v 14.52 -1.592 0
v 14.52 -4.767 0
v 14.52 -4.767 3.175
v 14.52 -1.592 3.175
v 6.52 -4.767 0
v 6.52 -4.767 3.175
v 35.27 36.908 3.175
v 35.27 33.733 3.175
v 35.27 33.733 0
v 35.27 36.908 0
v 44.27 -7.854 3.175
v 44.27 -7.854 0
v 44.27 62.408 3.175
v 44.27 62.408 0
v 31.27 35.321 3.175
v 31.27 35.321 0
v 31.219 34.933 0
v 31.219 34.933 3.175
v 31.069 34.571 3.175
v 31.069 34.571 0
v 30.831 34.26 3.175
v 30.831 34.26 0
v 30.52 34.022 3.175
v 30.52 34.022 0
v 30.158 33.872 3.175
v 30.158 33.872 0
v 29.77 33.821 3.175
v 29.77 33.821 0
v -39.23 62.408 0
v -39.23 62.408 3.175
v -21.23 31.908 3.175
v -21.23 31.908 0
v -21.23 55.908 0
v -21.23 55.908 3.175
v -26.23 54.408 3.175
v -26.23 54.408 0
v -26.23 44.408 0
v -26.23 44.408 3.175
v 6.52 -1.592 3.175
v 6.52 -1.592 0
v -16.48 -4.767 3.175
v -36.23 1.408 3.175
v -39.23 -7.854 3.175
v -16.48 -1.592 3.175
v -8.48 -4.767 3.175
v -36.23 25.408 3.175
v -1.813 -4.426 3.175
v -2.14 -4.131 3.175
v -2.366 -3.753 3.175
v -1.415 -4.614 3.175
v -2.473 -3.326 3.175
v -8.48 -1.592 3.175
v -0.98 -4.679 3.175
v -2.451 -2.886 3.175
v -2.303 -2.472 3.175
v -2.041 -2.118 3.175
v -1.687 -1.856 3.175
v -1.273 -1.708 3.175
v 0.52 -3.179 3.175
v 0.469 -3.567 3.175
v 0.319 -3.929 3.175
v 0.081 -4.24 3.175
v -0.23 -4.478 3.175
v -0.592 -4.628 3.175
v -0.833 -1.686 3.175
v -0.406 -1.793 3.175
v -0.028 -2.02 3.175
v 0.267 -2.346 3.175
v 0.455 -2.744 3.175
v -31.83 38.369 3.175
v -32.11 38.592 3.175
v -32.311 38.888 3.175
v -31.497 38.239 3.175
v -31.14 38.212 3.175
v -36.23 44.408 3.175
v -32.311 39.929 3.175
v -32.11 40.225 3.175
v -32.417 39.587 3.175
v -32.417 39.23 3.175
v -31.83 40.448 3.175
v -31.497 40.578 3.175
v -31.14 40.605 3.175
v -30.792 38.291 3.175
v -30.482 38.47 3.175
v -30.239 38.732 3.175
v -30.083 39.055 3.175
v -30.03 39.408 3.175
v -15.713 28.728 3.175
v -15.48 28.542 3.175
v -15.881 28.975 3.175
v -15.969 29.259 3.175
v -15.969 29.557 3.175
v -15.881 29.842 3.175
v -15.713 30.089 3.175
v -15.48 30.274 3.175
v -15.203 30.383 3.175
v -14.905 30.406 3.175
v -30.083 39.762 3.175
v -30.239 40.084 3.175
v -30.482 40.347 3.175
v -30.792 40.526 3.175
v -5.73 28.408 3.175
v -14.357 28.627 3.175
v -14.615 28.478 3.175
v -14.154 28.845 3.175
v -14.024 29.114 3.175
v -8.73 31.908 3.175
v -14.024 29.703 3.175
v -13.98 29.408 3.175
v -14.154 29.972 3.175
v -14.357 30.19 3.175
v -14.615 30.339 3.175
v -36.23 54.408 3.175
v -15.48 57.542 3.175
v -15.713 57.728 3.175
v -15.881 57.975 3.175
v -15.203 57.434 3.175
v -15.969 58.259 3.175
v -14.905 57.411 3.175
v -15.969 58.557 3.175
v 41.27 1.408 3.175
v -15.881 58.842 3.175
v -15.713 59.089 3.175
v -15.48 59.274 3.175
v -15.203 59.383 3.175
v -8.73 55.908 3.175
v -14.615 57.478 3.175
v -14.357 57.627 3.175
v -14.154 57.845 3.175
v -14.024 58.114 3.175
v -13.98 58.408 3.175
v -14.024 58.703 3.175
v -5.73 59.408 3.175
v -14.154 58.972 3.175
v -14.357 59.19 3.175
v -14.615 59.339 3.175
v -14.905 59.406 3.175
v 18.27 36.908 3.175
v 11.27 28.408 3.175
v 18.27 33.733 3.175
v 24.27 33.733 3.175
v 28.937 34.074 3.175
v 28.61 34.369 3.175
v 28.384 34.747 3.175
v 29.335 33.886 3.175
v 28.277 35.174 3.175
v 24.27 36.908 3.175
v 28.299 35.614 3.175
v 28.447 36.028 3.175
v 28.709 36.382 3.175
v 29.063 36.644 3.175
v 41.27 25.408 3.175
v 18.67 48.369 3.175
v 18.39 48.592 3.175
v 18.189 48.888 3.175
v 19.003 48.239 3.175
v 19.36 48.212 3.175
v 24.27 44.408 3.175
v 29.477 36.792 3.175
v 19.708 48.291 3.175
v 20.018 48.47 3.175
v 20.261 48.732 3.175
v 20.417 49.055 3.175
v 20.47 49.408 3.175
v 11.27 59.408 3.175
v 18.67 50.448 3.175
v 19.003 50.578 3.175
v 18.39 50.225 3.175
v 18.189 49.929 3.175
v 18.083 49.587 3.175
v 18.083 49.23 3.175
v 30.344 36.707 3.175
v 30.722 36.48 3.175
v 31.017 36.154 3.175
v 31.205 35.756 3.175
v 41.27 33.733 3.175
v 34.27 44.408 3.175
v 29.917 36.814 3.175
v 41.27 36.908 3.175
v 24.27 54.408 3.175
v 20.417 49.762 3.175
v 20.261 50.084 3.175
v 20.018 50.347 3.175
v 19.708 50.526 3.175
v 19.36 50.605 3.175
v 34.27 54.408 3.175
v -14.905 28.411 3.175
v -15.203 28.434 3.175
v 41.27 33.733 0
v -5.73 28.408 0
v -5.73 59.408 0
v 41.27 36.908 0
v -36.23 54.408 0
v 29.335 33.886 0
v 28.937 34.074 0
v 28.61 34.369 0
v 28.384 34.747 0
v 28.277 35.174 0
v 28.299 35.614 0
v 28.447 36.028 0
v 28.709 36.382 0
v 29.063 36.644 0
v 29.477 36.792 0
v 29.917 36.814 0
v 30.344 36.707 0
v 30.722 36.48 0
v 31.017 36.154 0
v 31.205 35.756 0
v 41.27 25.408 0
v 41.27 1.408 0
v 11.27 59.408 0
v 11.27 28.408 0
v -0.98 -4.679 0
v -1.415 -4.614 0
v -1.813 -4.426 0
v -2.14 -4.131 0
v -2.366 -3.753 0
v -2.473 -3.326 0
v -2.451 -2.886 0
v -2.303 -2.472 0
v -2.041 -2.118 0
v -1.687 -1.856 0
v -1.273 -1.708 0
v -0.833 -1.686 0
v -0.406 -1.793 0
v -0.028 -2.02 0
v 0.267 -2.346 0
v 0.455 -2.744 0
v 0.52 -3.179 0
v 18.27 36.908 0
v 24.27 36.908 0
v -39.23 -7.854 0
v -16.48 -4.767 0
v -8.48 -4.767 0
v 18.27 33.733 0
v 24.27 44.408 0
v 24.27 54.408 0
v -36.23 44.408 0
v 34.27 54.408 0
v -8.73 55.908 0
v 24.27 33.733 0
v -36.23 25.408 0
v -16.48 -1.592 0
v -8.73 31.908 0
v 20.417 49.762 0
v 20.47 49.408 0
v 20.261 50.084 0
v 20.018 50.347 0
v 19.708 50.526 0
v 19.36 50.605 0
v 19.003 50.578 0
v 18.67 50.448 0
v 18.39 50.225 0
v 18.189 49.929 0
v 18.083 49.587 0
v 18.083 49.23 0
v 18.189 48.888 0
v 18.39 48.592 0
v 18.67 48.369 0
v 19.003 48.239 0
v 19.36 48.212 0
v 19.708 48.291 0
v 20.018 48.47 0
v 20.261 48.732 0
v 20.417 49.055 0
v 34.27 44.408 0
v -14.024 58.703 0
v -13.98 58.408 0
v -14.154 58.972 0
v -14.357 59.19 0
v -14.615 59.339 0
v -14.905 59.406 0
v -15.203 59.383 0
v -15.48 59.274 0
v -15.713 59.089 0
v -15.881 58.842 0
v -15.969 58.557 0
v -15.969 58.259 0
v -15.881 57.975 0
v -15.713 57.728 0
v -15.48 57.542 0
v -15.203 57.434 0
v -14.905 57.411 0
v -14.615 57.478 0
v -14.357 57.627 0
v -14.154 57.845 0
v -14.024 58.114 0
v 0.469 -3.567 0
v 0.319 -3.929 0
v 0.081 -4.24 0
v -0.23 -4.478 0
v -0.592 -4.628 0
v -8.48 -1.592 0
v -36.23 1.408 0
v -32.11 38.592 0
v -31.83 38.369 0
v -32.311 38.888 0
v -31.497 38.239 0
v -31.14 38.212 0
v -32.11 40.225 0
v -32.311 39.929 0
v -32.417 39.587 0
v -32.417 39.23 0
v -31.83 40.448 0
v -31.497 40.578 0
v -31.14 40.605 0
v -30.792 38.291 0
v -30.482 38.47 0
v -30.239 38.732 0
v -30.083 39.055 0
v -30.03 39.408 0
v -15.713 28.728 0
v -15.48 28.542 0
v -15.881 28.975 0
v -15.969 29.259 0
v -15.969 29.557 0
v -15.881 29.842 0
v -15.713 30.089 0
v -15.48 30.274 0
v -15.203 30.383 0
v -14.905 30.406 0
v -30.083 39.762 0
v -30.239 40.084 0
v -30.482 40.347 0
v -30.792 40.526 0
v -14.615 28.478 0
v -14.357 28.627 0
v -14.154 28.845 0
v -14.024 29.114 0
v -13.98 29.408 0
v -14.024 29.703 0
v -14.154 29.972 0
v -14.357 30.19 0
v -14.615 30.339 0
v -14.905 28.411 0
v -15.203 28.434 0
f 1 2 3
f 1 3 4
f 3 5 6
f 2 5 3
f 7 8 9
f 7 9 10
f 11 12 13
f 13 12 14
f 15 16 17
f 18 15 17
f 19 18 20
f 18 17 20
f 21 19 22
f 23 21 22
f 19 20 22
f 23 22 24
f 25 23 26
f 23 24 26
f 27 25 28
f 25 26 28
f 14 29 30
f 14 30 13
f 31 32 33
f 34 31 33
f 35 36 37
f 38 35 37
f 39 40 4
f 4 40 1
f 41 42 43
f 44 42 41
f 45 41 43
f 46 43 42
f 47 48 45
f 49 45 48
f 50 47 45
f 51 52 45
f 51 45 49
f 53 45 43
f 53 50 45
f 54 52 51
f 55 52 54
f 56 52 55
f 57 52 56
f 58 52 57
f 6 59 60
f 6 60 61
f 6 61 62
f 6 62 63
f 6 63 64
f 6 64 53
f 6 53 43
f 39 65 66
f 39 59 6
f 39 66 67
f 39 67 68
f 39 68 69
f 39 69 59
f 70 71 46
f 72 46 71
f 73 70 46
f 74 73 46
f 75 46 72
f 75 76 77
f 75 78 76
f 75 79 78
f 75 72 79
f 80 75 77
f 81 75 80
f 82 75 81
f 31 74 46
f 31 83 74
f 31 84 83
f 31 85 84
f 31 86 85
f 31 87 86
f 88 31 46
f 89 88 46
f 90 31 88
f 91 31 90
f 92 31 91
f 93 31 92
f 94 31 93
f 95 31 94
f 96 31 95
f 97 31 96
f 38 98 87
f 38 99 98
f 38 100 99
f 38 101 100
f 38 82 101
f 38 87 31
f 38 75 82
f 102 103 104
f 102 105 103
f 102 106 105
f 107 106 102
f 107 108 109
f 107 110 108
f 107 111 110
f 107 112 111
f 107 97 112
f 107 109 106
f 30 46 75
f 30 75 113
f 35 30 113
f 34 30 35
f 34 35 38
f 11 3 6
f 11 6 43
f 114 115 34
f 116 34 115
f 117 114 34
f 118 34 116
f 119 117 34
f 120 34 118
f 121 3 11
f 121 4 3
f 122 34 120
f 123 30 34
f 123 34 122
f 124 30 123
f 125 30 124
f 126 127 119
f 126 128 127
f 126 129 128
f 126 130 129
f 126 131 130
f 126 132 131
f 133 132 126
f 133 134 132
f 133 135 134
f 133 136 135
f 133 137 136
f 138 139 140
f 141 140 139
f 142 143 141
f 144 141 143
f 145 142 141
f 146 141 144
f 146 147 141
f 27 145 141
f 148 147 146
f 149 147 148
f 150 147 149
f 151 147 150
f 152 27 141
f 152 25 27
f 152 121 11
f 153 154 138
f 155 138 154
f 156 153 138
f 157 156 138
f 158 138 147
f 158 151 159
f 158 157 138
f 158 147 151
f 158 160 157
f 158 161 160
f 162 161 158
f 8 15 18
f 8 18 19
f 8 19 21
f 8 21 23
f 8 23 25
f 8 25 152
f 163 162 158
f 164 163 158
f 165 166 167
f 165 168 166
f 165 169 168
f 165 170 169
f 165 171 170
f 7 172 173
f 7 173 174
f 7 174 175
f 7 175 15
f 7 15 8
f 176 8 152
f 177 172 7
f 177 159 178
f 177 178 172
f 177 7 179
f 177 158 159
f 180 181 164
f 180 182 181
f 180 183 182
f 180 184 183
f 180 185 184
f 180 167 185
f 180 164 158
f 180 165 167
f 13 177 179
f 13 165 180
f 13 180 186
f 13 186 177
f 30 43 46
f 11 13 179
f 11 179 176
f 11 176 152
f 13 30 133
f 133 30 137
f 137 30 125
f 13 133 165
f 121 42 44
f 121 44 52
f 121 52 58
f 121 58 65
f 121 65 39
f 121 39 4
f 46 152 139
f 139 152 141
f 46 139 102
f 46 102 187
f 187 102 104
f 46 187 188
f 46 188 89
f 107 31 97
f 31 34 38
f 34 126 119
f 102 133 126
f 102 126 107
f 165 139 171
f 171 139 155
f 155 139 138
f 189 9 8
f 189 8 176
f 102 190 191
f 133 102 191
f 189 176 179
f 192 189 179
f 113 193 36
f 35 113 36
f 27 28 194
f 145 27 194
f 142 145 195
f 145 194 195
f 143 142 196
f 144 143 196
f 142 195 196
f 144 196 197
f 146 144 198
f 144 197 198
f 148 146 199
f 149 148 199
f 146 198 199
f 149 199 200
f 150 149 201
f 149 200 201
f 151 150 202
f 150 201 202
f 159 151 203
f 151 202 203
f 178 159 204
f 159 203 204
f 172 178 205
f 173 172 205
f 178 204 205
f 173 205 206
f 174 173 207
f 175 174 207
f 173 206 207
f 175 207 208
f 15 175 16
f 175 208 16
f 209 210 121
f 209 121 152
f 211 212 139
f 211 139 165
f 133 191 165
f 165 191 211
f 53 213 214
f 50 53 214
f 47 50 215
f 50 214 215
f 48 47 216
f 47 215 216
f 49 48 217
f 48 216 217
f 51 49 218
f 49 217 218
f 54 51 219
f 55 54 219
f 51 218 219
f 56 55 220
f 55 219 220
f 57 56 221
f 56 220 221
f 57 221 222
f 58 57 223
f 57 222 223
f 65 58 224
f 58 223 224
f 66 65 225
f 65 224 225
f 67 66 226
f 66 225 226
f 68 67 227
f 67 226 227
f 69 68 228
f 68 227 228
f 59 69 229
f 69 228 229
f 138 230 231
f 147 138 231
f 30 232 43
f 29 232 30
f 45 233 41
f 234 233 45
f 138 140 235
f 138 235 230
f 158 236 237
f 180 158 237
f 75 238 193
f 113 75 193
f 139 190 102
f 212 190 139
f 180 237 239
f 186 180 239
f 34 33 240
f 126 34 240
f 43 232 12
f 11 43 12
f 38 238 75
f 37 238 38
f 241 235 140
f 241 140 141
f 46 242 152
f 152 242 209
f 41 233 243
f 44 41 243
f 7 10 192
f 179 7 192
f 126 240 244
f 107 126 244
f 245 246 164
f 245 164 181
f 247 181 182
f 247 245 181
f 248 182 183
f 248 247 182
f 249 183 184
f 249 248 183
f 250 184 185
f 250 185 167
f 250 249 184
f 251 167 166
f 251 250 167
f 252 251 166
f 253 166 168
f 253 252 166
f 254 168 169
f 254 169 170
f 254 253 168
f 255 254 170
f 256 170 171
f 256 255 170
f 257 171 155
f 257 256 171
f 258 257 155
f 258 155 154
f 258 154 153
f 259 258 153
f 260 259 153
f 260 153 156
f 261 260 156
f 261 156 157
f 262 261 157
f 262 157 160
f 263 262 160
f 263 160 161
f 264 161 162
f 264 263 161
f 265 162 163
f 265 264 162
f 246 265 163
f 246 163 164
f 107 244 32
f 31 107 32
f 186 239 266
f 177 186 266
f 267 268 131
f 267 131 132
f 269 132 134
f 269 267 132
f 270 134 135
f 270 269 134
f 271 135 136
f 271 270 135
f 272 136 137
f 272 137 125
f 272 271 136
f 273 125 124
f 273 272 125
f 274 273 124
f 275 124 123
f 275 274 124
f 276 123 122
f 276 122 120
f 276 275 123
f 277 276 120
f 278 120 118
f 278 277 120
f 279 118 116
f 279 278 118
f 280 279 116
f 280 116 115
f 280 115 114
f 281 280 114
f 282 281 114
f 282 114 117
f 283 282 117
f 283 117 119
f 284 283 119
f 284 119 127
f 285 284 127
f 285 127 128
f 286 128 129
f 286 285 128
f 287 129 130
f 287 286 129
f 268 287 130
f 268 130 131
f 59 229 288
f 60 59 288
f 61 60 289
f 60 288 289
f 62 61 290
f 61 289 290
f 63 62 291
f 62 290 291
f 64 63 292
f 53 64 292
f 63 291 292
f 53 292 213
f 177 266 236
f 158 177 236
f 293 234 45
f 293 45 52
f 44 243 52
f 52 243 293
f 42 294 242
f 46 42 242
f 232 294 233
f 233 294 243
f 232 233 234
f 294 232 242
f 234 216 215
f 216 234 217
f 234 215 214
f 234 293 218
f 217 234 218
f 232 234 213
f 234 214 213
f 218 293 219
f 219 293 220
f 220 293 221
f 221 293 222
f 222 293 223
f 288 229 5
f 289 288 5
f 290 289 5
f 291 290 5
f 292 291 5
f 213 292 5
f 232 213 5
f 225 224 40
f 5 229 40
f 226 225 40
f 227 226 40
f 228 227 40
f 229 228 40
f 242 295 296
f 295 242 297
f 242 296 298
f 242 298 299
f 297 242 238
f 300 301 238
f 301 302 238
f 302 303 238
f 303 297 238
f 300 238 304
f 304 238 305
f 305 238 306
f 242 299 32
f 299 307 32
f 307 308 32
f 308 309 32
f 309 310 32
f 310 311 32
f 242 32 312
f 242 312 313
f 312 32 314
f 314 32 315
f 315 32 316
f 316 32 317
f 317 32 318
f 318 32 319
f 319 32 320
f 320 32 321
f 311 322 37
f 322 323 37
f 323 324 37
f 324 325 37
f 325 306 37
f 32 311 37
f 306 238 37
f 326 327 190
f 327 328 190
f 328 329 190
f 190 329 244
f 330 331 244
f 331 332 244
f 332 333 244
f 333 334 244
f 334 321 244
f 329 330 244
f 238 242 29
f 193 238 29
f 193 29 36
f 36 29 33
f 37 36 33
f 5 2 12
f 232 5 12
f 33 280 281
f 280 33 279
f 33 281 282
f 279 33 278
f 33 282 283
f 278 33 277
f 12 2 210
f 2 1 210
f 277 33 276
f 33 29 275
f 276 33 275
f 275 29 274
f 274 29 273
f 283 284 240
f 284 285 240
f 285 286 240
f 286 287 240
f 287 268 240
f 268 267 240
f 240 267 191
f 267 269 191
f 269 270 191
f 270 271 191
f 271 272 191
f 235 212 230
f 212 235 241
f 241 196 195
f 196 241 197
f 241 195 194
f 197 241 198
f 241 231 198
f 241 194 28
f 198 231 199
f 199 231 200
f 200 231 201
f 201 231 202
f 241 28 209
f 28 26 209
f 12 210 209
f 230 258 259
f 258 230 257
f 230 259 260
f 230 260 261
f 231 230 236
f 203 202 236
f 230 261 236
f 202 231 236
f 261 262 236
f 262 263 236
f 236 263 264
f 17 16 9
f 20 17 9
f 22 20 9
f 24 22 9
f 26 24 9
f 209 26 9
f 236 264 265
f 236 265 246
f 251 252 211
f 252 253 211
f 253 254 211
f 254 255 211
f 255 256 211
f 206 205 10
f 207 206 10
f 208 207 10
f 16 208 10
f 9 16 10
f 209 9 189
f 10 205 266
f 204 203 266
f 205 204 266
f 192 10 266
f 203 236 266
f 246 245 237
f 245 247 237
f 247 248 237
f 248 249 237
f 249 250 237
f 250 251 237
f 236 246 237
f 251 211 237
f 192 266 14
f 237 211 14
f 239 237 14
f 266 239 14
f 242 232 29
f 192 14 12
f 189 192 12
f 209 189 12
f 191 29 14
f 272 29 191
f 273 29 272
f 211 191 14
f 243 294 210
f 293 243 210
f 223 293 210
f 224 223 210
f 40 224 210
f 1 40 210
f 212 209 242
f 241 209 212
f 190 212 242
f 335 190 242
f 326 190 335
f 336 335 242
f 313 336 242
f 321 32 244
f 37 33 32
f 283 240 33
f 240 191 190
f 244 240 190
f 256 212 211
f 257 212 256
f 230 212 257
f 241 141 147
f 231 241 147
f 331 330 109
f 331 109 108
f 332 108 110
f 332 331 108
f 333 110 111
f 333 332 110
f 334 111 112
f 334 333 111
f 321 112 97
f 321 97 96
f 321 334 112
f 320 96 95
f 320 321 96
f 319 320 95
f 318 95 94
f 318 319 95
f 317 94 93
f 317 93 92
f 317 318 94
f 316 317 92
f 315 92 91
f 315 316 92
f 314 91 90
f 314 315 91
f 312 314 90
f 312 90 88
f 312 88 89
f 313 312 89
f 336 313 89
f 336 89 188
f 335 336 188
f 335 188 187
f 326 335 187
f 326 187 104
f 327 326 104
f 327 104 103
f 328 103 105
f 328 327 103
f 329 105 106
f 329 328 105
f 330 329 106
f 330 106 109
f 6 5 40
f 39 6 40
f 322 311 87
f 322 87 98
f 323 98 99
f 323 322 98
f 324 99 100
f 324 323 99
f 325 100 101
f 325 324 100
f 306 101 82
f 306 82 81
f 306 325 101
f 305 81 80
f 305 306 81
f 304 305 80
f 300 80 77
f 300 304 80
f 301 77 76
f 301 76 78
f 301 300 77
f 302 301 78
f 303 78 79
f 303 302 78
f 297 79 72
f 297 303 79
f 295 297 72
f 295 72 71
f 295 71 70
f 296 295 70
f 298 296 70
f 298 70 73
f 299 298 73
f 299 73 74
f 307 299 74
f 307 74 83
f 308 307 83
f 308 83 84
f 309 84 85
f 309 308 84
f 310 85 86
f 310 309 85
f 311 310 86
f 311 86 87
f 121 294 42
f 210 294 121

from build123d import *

# Parameters (mm, degrees)
F0_W     = 83.5
F0_H     = 70.2625
F0_W_2   = 8
F0_H_2   = 3.175
F0_W_3   = 77.5
F0_H_3   = 24
F0_R     = 1
F0_W_4   = 6
F0_W_5   = 17
F0_H_4   = 31
F0_W_6   = 10
F0_H_5   = 10
F0_R_2   = 1.2
F1_DEPTH = 3.175


# Not quite as in the source:
# - a length typed as a fraction of an inch, garbled in the dataset ("3 / 203.2 mm" for 3/8 in), is restored
# - a feature names something its author has since deleted; it is built from what else it names


with BuildPart() as f1:
    # F0 (on Top) → F1 (new body)
    with BuildSketch(Plane.XY):
        with Locations((2.5199788651, 27.2772044539)):
            Rectangle(F0_W, F0_H)
        with Locations((-12.4800211349, -3.1790455461)):
            Rectangle(F0_W_2, F0_H_2, mode=Mode.SUBTRACT)
        with BuildLine():
            ThreePointArc((-0.9800211349, -4.6790455461), (-2.0406813067, -2.1183853743), (0.5199788651, -3.1790455461))
            ThreePointArc((0.5199788651, -3.1790455461), (0.0806390368, -4.2397057179), (-0.9800211349, -4.6790455461))
        make_face(mode=Mode.SUBTRACT)
        with Locations((10.5199788651, -3.1790455461)):
            Rectangle(F0_W_2, F0_H_2, mode=Mode.SUBTRACT)
        with Locations((2.5199788651, 13.4084544539)):
            Rectangle(F0_W_3, F0_H_3, mode=Mode.SUBTRACT)
        Polygon((-36.2300211349, 34.4084544539), (-36.230021135, 44.4084544539), (-36.230021135, 54.4084544539), (-26.230021135, 54.4084544539), (-26.230021135, 44.4084544539), (-26.2300211349, 34.4084544539), align=None, mode=Mode.SUBTRACT)
        with Locations((-14.980021135, 29.4084544539)):
            Circle(F0_R, mode=Mode.SUBTRACT)
        Polygon((-21.230021135, 31.9084544539), (-21.230021135, 55.9084544539), (-8.730021135, 55.9084544539), (-8.730021135, 43.9084544539), (-8.730021135, 31.9084544539), align=None, mode=Mode.SUBTRACT)
        with Locations((-14.980021135, 58.4084544539)):
            Circle(F0_R, mode=Mode.SUBTRACT)
        with Locations((21.2699788651, 35.3209544539)):
            Rectangle(F0_W_4, F0_H_2, mode=Mode.SUBTRACT)
        with Locations((2.7699788651, 43.9084544539)):
            Rectangle(F0_W_5, F0_H_4, mode=Mode.SUBTRACT)
        with BuildLine():
            ThreePointArc((29.7699788651, 33.8209544539), (28.7093186933, 36.3816146257), (31.2699788651, 35.3209544539))
            ThreePointArc((31.2699788651, 35.3209544539), (30.8306390368, 34.2602942821), (29.7699788651, 33.8209544539))
        make_face(mode=Mode.SUBTRACT)
        with Locations((38.2699788651, 35.3209544539)):
            Rectangle(F0_W_4, F0_H_2, mode=Mode.SUBTRACT)
        Polygon((14.2699788651, 54.4084544539), (24.2699788651, 54.4084544539), (34.2699788651, 54.4084544539), (34.2699788651, 44.4084544539), (24.2699788651, 44.4084544539), (14.2699788651, 44.4084544539), align=None, mode=Mode.SUBTRACT)
        with Locations((-31.2300211349, 39.4084544539)):
            Rectangle(F0_W_6, F0_H_5)
        with Locations((-31.230021135, 39.4084544539)):
            Circle(F0_R_2, mode=Mode.SUBTRACT)
        with Locations((19.2699788651, 49.4084544539)):
            Rectangle(F0_W_6, F0_H_5)
        with Locations((19.2699788651, 49.4084544539)):
            Circle(F0_R_2, mode=Mode.SUBTRACT)
    extrude(amount=F1_DEPTH)


solid = f1.part
